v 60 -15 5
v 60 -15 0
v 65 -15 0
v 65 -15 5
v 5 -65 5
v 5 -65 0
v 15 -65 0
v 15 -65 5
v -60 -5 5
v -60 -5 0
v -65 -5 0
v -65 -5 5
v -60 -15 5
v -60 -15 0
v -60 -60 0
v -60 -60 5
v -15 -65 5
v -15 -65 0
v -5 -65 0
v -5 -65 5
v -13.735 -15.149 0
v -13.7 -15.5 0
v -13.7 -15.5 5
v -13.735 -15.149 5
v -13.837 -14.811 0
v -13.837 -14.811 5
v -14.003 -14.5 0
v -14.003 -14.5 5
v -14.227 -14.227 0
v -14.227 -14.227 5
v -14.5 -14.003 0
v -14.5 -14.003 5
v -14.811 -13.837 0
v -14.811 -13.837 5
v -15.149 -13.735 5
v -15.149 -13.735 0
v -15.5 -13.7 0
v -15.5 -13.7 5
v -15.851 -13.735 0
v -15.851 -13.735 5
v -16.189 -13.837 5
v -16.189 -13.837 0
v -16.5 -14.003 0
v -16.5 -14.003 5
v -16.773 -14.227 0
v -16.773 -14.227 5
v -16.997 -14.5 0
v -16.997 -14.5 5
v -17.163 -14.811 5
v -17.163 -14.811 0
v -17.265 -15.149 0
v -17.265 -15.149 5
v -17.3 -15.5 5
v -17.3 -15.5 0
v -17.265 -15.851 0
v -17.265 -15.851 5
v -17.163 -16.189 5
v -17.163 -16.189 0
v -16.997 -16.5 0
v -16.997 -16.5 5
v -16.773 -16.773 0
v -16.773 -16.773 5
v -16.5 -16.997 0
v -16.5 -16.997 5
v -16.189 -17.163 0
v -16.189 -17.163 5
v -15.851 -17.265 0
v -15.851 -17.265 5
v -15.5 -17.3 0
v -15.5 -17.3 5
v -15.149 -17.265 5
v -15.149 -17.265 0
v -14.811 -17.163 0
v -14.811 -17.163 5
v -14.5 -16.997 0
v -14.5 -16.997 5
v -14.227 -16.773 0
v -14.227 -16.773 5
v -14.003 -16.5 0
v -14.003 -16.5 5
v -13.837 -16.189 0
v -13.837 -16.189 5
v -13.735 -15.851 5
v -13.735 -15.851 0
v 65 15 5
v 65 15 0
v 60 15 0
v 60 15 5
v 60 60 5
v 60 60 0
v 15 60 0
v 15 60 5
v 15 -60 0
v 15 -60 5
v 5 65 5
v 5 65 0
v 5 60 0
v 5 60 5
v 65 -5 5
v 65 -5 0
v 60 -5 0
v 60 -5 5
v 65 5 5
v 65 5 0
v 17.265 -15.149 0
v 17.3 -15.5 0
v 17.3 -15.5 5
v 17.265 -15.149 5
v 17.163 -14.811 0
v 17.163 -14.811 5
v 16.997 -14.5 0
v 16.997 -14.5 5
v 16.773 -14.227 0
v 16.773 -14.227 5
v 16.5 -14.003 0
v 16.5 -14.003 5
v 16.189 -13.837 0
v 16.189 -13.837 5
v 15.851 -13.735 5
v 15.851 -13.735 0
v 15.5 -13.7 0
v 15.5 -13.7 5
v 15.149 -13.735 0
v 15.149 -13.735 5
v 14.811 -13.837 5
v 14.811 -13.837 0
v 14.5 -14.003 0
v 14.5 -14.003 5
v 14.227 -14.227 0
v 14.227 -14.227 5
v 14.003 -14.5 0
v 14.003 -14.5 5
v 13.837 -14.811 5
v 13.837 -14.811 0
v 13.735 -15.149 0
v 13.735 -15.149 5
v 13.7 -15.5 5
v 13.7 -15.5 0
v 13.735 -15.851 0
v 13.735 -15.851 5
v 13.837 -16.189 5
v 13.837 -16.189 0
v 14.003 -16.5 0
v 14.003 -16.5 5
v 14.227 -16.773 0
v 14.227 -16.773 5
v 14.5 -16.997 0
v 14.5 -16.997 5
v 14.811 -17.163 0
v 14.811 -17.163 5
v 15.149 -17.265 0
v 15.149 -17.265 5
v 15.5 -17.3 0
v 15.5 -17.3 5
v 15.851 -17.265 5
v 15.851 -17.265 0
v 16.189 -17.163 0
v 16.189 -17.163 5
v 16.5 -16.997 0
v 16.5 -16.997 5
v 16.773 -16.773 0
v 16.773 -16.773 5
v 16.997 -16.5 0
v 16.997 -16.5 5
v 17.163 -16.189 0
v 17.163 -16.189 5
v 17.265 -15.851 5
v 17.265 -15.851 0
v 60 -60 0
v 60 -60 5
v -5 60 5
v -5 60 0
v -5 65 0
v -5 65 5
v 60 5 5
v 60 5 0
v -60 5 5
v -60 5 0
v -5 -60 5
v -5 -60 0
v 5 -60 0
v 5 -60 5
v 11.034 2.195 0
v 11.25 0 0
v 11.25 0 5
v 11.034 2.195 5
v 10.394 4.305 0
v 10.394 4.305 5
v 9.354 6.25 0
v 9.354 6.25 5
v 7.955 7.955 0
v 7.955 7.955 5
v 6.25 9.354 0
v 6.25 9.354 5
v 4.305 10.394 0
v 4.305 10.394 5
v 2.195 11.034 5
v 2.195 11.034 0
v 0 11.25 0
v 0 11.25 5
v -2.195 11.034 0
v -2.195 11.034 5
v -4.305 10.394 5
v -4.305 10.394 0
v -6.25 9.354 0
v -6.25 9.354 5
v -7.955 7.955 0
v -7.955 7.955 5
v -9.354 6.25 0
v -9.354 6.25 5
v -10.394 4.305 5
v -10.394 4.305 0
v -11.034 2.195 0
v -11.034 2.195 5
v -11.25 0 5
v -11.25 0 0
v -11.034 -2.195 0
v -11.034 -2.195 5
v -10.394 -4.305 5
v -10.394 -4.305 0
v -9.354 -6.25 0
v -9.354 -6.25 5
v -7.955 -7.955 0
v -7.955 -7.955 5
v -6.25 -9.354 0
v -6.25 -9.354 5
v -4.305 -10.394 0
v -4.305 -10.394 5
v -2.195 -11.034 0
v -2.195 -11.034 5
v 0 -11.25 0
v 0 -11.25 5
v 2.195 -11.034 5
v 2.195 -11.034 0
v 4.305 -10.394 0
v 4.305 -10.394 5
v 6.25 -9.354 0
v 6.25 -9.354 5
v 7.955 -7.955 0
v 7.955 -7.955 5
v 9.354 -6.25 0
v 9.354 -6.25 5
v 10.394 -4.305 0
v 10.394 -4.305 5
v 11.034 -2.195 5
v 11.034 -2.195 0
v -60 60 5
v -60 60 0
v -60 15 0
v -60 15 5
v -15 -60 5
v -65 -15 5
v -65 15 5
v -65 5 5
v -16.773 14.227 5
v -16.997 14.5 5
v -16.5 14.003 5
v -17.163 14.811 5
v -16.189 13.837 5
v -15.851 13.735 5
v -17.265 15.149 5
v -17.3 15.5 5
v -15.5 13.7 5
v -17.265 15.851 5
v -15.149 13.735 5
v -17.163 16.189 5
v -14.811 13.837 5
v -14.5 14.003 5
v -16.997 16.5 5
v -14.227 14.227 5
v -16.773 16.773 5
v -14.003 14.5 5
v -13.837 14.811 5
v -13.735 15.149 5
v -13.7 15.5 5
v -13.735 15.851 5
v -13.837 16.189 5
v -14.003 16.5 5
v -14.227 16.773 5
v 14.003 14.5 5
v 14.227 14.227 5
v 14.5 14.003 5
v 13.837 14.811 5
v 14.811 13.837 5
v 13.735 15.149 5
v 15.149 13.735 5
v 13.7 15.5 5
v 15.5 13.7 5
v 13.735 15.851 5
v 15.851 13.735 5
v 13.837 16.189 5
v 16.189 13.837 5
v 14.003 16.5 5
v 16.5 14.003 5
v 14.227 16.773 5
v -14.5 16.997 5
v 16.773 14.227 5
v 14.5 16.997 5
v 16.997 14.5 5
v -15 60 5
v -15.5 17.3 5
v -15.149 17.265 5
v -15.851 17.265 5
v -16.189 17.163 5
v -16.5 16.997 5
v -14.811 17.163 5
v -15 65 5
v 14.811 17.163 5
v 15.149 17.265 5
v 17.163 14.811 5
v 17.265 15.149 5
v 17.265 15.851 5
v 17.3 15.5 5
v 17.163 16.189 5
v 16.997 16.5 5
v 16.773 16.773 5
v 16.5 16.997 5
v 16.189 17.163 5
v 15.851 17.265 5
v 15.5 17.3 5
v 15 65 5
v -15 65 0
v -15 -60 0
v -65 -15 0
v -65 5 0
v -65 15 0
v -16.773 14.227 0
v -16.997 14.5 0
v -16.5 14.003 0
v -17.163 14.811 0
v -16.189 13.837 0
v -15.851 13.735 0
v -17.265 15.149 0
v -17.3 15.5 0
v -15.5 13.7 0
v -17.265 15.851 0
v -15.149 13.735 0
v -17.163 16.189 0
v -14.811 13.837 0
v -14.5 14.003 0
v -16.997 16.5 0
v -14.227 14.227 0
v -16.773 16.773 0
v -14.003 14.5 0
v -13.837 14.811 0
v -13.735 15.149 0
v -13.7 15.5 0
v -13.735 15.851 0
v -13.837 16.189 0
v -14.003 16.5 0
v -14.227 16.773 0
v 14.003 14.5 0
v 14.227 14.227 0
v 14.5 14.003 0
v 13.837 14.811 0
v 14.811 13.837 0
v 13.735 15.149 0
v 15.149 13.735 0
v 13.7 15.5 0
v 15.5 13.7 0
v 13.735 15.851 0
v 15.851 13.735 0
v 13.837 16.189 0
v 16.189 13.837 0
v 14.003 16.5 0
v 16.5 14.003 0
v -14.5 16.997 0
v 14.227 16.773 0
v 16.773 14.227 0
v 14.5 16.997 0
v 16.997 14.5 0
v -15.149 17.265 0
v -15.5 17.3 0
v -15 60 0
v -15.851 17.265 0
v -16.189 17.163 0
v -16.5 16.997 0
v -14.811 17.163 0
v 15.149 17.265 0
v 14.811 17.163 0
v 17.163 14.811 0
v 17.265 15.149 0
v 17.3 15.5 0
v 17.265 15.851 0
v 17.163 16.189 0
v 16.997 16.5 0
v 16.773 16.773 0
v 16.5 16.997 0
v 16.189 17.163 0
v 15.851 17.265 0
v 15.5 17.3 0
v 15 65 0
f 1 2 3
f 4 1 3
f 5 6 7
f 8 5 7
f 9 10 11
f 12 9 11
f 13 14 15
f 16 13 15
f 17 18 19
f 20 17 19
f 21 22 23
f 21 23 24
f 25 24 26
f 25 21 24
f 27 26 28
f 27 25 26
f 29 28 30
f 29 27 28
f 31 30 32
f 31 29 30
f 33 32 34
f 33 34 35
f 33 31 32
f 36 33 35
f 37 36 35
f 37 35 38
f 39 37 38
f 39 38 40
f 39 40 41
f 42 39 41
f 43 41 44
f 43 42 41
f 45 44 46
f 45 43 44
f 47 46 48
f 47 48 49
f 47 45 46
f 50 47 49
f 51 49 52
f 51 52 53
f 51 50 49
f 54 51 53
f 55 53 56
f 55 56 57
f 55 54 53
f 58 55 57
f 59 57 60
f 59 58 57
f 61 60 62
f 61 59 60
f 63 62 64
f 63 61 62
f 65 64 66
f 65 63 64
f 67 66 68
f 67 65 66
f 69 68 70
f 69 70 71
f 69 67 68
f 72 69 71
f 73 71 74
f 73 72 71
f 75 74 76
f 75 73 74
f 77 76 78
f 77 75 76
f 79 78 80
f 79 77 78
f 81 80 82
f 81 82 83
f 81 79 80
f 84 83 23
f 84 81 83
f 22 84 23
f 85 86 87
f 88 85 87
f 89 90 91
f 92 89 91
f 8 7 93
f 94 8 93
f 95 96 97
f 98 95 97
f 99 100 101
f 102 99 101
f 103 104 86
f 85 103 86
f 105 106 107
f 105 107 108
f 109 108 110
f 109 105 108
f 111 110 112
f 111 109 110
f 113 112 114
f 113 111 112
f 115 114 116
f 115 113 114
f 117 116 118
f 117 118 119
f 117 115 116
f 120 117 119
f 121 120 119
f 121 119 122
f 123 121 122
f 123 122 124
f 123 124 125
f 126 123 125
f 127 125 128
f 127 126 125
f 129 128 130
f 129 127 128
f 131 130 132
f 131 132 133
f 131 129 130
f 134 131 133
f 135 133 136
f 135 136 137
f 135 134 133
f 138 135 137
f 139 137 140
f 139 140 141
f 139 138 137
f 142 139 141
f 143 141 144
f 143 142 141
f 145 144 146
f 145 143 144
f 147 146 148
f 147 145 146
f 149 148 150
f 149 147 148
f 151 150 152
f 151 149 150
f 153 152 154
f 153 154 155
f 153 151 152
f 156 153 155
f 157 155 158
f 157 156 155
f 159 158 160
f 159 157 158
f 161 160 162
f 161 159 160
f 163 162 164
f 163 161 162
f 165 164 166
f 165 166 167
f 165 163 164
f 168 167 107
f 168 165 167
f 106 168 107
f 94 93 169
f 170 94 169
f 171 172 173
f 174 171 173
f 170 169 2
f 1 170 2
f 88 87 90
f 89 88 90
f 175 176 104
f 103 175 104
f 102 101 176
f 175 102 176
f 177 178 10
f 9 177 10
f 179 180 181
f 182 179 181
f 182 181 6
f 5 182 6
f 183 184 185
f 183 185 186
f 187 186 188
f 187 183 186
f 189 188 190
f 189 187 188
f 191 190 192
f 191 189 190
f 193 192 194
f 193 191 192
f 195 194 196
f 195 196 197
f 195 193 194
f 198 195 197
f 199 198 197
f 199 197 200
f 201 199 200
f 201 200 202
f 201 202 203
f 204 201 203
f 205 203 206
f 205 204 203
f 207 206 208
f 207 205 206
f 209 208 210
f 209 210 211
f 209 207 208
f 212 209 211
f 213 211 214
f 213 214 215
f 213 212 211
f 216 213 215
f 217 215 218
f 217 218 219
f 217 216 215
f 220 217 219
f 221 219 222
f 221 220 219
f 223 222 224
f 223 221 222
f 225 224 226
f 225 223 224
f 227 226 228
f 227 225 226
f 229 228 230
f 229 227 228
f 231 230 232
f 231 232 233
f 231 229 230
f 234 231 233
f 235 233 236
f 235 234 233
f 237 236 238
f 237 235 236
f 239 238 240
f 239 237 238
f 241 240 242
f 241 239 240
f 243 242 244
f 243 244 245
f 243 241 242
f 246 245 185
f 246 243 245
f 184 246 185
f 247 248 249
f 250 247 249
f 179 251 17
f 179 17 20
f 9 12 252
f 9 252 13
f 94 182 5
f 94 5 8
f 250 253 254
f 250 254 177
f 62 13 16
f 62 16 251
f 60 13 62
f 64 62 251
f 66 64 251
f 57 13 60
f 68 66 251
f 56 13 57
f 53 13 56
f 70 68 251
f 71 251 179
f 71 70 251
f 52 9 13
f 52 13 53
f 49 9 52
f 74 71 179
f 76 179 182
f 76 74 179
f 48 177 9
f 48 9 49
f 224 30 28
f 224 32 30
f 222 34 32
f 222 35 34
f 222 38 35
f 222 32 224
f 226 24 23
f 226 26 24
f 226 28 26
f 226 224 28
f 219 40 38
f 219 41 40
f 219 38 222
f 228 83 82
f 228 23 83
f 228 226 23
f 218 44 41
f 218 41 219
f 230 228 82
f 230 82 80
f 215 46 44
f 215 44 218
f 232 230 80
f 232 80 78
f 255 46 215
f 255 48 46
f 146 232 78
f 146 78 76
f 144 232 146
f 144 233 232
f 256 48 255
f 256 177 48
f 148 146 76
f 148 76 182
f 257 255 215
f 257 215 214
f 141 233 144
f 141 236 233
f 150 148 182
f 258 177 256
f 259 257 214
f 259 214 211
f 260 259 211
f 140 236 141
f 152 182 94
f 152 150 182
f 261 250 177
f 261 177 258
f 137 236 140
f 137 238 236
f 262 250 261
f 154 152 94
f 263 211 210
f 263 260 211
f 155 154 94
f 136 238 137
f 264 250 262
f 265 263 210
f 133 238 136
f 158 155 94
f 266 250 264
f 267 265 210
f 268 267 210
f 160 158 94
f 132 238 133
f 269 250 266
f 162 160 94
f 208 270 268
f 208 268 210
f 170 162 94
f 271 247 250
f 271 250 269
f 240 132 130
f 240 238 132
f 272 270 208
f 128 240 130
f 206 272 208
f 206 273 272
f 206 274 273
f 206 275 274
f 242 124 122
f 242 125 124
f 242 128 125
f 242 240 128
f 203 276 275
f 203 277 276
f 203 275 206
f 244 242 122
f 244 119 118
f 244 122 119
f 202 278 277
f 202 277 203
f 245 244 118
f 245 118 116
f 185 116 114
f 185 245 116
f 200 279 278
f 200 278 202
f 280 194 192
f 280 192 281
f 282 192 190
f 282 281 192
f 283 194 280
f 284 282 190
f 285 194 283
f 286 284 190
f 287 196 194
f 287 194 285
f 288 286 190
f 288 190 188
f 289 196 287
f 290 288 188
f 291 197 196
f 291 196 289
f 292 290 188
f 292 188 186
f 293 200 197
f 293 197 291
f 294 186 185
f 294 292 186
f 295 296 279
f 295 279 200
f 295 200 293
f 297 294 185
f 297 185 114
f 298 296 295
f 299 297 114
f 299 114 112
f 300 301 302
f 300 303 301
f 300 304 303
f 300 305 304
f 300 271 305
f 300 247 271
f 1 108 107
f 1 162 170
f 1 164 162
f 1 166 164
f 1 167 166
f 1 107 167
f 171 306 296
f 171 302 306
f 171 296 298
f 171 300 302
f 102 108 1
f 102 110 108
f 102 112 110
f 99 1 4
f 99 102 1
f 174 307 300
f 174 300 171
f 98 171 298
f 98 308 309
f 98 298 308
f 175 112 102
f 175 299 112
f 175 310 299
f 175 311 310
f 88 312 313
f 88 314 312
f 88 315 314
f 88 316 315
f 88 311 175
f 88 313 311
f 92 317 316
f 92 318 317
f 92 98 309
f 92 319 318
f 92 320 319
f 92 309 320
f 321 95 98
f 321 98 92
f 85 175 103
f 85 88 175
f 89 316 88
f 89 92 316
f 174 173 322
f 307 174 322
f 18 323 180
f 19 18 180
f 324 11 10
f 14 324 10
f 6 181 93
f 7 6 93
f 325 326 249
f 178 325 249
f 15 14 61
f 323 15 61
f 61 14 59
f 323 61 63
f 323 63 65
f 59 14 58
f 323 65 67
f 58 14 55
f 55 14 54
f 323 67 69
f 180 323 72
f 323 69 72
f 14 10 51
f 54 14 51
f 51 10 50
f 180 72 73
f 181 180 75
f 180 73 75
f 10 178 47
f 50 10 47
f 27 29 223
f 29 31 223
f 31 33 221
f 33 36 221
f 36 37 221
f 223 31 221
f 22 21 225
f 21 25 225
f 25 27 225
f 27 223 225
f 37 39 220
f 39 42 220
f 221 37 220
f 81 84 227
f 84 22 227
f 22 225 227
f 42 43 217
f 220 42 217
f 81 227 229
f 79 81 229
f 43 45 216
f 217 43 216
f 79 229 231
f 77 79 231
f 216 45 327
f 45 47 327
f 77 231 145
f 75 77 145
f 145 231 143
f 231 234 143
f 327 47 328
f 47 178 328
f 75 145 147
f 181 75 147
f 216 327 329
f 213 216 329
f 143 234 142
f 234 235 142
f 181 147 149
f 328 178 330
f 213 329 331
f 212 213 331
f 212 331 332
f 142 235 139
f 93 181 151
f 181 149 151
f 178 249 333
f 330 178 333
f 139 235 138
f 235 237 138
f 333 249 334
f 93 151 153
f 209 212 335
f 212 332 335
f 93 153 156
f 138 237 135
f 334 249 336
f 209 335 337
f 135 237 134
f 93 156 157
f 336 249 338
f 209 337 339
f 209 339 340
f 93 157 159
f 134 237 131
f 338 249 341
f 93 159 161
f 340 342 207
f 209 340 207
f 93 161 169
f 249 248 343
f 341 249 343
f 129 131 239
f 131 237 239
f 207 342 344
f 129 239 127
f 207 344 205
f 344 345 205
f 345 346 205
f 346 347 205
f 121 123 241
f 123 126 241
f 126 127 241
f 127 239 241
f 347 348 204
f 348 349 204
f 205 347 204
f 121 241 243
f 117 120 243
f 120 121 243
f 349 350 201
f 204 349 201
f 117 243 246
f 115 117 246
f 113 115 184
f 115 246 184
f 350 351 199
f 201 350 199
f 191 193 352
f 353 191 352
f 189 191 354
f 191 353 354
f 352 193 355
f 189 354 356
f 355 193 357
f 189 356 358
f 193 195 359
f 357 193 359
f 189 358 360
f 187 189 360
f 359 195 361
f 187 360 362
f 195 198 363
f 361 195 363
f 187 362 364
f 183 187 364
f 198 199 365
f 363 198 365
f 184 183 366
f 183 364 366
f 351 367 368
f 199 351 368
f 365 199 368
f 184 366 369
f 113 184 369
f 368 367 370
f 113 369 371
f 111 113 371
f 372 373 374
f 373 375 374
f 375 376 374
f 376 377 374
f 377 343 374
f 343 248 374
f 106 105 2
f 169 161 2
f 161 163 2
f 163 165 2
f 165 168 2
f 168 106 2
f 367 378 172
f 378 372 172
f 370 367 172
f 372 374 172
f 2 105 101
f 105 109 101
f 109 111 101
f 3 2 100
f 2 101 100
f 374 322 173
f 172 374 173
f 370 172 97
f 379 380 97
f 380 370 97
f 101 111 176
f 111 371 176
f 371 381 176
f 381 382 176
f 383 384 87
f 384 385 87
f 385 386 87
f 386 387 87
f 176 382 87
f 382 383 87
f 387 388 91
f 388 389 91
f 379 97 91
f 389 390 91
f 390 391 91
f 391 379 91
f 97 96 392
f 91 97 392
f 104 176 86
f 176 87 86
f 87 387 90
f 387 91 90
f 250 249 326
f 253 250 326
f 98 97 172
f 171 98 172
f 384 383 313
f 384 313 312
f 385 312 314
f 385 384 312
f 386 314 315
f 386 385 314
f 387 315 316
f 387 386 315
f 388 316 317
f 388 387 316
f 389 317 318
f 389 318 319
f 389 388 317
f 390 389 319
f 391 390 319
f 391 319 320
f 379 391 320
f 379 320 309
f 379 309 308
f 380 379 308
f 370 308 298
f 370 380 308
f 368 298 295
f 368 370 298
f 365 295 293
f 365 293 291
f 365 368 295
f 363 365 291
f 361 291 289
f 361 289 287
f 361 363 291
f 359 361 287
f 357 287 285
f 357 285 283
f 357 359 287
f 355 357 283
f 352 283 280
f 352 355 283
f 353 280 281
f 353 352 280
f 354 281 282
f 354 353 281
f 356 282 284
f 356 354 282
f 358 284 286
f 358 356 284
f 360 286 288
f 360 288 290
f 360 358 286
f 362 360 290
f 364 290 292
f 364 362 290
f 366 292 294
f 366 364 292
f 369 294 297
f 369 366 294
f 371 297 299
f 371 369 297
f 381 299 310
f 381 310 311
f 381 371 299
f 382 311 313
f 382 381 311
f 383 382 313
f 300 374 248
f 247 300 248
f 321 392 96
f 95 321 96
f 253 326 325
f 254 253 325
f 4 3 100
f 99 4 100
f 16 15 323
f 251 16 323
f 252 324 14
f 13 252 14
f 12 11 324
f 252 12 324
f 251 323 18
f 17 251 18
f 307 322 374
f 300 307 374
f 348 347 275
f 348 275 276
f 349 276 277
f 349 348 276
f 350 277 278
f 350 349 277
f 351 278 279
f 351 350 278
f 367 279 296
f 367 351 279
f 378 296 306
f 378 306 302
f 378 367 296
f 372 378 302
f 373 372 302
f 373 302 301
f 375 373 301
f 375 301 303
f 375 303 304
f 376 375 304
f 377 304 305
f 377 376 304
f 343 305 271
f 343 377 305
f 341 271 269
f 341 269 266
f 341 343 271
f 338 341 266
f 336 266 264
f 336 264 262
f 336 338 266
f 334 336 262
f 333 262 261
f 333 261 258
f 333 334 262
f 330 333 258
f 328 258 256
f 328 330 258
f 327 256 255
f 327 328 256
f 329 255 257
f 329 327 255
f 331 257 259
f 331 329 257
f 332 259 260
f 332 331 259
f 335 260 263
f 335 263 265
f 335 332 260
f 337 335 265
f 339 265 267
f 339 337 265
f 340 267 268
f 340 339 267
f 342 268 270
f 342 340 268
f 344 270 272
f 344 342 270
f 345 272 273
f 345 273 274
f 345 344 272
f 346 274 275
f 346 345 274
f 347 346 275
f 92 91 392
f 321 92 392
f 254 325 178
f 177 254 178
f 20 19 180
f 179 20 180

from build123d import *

# Parameters (mm, degrees)
SKETCH1_R           = 11.25
SKETCH1_R_2         = 1.8
BOSS_EXTRUDE1_DEPTH = 5


with BuildPart() as part:
    # Sketch1 → Boss-Extrude1 (new body)
    with BuildSketch(Plane.XY):
        Polygon((5, 60), (-5, 60), (-5, 65), (-15, 65), (-15, 60), (-60, 60), (-60, 15), (-65, 15), (-65, 5), (-60, 5), (-60, -5), (-65, -5), (-65, -15), (-60, -15), (-60, -60), (-15, -60), (-15, -65), (-5, -65), (-5, -60), (5, -60), (5, -65), (15, -65), (15, -60), (60, -60), (60, -15), (65, -15), (65, -5), (60, -5), (60, 5), (65, 5), (65, 15), (60, 15), (60, 60), (15, 60), (15, 65), (5, 65), align=None)
        Circle(SKETCH1_R, mode=Mode.SUBTRACT)
        with Locations((-15.5, 15.5)):
            Circle(SKETCH1_R_2, mode=Mode.SUBTRACT)
        with Locations((15.5, 15.5)):
            Circle(SKETCH1_R_2, mode=Mode.SUBTRACT)
        with Locations((15.5, -15.5)):
            Circle(SKETCH1_R_2, mode=Mode.SUBTRACT)
        with Locations((-15.5, -15.5)):
            Circle(SKETCH1_R_2, mode=Mode.SUBTRACT)
    extrude(amount=BOSS_EXTRUDE1_DEPTH)


solid = part.part
